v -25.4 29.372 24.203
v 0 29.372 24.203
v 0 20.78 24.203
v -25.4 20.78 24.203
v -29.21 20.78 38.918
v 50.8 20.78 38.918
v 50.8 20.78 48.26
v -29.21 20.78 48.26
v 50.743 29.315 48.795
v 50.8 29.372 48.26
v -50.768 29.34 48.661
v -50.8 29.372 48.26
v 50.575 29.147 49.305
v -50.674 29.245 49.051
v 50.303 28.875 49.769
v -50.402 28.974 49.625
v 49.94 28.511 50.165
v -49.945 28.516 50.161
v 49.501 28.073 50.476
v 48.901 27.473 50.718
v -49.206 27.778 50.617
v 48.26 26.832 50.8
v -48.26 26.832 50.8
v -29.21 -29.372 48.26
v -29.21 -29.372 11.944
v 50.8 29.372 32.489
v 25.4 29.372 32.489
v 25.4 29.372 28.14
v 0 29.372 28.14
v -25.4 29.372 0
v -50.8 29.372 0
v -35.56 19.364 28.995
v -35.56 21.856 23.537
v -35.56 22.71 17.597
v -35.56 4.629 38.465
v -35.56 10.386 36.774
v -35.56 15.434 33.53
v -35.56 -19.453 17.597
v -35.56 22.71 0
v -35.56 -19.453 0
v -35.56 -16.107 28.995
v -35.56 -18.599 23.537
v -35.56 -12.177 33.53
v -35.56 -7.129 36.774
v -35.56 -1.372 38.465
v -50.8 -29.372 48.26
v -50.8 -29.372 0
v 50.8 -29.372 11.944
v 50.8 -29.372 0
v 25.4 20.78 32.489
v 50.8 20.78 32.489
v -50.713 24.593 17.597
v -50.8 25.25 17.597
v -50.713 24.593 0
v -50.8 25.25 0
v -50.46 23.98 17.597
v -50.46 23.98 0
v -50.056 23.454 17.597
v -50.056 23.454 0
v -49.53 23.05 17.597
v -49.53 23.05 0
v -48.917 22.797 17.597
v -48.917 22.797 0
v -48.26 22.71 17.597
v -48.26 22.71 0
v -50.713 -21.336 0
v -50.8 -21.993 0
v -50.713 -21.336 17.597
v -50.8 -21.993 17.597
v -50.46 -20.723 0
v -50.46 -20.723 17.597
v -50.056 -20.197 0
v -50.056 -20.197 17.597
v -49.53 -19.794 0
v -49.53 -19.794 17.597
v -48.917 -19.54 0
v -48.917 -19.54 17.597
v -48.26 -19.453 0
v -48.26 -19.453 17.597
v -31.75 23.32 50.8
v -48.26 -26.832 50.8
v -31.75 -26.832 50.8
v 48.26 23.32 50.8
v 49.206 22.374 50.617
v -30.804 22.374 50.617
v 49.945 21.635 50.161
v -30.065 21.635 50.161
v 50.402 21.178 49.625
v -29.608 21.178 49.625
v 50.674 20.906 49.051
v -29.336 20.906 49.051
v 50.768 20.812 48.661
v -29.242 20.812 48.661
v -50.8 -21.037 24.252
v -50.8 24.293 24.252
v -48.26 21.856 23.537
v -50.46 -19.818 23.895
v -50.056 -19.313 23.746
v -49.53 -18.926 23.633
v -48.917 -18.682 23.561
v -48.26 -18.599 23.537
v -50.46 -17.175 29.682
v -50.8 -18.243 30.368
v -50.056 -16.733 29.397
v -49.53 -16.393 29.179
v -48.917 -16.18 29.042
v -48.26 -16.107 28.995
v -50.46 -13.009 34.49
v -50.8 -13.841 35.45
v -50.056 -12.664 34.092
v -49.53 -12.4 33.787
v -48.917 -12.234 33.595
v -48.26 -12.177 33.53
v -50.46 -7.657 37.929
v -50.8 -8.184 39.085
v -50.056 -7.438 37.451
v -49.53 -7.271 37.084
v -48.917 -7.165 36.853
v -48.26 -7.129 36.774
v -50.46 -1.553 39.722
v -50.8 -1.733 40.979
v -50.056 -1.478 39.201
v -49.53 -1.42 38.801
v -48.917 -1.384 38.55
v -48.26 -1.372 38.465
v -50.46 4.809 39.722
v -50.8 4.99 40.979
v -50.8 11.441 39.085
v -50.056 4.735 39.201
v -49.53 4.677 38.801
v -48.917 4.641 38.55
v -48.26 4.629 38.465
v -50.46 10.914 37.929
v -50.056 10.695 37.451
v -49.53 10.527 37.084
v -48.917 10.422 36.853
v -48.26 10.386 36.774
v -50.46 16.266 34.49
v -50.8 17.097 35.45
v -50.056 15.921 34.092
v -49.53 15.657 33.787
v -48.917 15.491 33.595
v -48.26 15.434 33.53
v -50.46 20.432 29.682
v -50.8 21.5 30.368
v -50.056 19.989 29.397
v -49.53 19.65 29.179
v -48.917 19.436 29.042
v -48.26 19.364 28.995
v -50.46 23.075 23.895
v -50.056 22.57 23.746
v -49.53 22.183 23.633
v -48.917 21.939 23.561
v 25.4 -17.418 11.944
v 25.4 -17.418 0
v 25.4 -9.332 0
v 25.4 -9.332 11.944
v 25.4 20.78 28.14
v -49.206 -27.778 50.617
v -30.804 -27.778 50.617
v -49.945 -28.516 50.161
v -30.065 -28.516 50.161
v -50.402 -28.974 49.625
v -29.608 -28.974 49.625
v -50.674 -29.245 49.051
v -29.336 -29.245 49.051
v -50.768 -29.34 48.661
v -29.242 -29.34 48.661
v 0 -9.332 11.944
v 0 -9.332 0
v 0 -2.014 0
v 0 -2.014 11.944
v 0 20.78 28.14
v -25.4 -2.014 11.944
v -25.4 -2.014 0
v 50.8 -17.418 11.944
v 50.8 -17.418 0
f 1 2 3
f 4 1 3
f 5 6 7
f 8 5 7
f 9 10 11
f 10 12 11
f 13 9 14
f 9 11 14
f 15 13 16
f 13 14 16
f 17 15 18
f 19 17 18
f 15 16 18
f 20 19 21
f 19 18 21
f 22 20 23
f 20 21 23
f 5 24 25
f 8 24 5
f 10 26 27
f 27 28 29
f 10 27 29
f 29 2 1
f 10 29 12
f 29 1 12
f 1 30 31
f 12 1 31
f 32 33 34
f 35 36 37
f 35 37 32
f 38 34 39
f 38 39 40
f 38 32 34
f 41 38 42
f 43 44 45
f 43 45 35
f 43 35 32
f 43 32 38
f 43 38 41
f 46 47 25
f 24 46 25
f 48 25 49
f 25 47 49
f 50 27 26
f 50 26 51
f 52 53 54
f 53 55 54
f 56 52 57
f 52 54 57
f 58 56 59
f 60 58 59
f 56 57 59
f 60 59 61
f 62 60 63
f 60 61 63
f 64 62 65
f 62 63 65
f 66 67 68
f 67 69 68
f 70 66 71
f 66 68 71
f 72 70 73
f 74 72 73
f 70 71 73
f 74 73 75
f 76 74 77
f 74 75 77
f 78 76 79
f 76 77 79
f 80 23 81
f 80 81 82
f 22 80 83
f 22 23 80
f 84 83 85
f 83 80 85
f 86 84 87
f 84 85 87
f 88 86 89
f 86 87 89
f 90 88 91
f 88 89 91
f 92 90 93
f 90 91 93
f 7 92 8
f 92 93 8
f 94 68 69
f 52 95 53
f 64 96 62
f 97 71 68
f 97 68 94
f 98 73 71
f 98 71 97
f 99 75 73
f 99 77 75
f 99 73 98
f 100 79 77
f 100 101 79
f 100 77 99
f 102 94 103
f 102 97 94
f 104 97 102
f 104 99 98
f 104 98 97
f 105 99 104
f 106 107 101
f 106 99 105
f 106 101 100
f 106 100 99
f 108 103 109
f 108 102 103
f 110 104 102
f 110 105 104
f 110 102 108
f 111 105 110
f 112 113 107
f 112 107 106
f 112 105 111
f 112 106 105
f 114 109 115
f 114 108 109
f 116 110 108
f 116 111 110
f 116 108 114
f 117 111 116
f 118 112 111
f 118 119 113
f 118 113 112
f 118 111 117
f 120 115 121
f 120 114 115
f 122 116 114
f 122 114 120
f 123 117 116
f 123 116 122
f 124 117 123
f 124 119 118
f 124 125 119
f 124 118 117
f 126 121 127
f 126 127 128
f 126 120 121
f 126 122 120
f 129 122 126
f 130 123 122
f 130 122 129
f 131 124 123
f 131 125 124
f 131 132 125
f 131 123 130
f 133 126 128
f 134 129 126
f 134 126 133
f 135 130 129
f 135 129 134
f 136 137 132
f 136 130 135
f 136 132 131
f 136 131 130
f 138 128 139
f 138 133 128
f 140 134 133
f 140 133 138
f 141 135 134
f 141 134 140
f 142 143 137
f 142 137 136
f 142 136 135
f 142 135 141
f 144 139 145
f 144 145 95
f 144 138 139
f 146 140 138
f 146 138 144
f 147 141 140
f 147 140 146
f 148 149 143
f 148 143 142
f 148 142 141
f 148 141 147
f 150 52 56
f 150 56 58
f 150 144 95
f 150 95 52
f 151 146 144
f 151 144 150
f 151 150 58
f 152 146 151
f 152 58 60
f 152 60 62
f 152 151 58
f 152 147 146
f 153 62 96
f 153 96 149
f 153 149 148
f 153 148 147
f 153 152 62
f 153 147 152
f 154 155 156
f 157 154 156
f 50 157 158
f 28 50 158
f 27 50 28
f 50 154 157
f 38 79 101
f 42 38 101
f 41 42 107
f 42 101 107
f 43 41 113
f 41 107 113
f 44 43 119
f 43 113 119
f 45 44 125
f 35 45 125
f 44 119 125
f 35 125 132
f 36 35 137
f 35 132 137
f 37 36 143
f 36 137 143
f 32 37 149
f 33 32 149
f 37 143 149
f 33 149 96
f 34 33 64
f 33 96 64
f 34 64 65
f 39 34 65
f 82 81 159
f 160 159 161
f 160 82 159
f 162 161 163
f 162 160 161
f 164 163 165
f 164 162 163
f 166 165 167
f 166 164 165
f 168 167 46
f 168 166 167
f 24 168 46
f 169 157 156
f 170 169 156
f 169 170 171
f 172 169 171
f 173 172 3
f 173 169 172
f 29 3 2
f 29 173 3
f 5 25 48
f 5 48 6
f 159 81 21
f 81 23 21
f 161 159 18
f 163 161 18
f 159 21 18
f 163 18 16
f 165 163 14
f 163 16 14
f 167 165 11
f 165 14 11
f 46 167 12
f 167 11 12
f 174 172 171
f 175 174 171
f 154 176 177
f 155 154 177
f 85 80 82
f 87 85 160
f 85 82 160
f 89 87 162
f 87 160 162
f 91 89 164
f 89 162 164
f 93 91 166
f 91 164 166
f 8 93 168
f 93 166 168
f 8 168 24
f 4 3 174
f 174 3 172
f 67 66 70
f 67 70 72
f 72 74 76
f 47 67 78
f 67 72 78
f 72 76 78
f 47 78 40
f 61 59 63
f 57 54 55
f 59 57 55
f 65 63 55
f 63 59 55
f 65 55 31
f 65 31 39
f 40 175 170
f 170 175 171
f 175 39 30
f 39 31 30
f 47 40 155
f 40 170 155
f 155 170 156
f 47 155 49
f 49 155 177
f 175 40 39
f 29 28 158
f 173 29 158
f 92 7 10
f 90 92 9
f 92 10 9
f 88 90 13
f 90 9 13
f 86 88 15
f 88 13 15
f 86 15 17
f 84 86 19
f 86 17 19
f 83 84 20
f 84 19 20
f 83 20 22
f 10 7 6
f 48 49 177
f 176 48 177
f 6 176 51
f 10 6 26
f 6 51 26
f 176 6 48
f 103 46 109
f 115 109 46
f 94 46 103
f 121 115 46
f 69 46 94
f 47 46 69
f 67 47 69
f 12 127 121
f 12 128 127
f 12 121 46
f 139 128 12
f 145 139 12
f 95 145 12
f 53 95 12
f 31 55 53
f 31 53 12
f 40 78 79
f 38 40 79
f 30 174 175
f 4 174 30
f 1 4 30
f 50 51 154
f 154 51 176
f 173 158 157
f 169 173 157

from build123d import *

# Parameters (mm, degrees)
F0_W      = 76.2
F0_H      = 58.7432836175
F0_W_2    = 12.7
F1_DEPTH  = 50.8
F3_DEPTH  = 15.24
F5_DEPTH  = 80.01
F7_DEPTH  = 25.4
F8_R      = 2.54
F10_DEPTH = 25.4
F11_W     = 43.6744932085
F11_H     = 27.1944999695
F12_DEPTH = 25.4
F14_DEPTH = 25.4


with BuildPart() as f1:
    # F0 (on Top) → F1 (new body)
    with BuildSketch(Plane.XY):
        Rectangle(F0_W, F0_H)
        with Locations((44.45, 0)):
            Rectangle(F0_W_2, F0_H)
        with Locations((-44.45, 0)):
            Rectangle(F0_W_2, F0_H)
    extrude(amount=F1_DEPTH)

    # F2 (on face) → F3 (cut)
    with BuildSketch(Plane(origin=(-50.8, 0, 0), x_dir=(0, -1, 0), z_dir=(-1, 0, 0))):
        with BuildLine():
            Line((-22.7101761848, 17.5973810256), (-22.7101761848, 0))
            Line((-22.7101761848, 0), (19.4533672184, 0))
            Line((19.4533672184, 0), (19.4533672184, 17.5973810256))
            ThreePointArc((19.4533672184, 17.5973810256), (-1.6284044832, 38.6791527271), (-22.7101761848, 17.5973810256))
        make_face()
    extrude(amount=-F3_DEPTH, mode=Mode.SUBTRACT)

    # F4 (on face) → F5 (cut)
    with BuildSketch(Plane.YZ.offset(50.8)):
        Polygon((-29.3716418087, 50.8), (-29.3716418087, 11.9435014203), (20.7798294723, 38.9182642102), (20.7798294723, 50.8), align=None)
    extrude(amount=-F5_DEPTH, mode=Mode.SUBTRACT)

    # F6 (on face) → F7 (cut)
    with BuildSketch(Plane.YZ.offset(50.8)):
        Polygon((-17.4182243645, 11.9435014203), (-17.4182243645, 0), (20.7798294723, 0), (29.3716418087, 0), (29.3716418087, 32.4889294001), (20.7798294723, 32.4889294001), align=None)
    extrude(amount=-F7_DEPTH, mode=Mode.SUBTRACT)

    # F8
    f8_edges = [f1.edges().sort_by_distance(p)[0] for p in [
        (10.795, 20.779829, 50.8),
        (-29.21, -4.295906, 50.8),
        (-40.005, -29.371642, 50.8),
        (-50.8, 0, 50.8),
        (0, 29.371642, 50.8),
        (50.8, 25.075736, 50.8),
        (-50.8, 1.628404, 38.679153),
    ]]
    fillet(f8_edges, radius=F8_R)

    # F9 (on face) → F10 (cut)
    with BuildSketch(Plane.YZ.offset(25.4)):
        Polygon((-9.3324668705, 11.9435014203), (-9.3324668705, 0), (29.3716418087, 0), (29.3716418087, 28.1398767242), (20.7798294723, 28.1398767242), align=None)
    extrude(amount=-F10_DEPTH, mode=Mode.SUBTRACT)

    # F11 (on Top) → F12 (cut)
    with BuildSketch(Plane.XY):
        with Locations((45.2370969579, 16.5996663272)):
            Rectangle(F11_W, F11_H)
    extrude(amount=-F12_DEPTH, mode=Mode.SUBTRACT)

    # F13 (on face) → F14 (cut)
    with BuildSketch(Plane.YZ):
        Polygon((-2.0139215048, 11.9435014203), (-2.0139215048, 0), (29.3716418087, 0), (29.3716418087, 24.2034812374), (20.7798294723, 24.2034812374), align=None)
    extrude(amount=-F14_DEPTH, mode=Mode.SUBTRACT)


solid = f1.part
